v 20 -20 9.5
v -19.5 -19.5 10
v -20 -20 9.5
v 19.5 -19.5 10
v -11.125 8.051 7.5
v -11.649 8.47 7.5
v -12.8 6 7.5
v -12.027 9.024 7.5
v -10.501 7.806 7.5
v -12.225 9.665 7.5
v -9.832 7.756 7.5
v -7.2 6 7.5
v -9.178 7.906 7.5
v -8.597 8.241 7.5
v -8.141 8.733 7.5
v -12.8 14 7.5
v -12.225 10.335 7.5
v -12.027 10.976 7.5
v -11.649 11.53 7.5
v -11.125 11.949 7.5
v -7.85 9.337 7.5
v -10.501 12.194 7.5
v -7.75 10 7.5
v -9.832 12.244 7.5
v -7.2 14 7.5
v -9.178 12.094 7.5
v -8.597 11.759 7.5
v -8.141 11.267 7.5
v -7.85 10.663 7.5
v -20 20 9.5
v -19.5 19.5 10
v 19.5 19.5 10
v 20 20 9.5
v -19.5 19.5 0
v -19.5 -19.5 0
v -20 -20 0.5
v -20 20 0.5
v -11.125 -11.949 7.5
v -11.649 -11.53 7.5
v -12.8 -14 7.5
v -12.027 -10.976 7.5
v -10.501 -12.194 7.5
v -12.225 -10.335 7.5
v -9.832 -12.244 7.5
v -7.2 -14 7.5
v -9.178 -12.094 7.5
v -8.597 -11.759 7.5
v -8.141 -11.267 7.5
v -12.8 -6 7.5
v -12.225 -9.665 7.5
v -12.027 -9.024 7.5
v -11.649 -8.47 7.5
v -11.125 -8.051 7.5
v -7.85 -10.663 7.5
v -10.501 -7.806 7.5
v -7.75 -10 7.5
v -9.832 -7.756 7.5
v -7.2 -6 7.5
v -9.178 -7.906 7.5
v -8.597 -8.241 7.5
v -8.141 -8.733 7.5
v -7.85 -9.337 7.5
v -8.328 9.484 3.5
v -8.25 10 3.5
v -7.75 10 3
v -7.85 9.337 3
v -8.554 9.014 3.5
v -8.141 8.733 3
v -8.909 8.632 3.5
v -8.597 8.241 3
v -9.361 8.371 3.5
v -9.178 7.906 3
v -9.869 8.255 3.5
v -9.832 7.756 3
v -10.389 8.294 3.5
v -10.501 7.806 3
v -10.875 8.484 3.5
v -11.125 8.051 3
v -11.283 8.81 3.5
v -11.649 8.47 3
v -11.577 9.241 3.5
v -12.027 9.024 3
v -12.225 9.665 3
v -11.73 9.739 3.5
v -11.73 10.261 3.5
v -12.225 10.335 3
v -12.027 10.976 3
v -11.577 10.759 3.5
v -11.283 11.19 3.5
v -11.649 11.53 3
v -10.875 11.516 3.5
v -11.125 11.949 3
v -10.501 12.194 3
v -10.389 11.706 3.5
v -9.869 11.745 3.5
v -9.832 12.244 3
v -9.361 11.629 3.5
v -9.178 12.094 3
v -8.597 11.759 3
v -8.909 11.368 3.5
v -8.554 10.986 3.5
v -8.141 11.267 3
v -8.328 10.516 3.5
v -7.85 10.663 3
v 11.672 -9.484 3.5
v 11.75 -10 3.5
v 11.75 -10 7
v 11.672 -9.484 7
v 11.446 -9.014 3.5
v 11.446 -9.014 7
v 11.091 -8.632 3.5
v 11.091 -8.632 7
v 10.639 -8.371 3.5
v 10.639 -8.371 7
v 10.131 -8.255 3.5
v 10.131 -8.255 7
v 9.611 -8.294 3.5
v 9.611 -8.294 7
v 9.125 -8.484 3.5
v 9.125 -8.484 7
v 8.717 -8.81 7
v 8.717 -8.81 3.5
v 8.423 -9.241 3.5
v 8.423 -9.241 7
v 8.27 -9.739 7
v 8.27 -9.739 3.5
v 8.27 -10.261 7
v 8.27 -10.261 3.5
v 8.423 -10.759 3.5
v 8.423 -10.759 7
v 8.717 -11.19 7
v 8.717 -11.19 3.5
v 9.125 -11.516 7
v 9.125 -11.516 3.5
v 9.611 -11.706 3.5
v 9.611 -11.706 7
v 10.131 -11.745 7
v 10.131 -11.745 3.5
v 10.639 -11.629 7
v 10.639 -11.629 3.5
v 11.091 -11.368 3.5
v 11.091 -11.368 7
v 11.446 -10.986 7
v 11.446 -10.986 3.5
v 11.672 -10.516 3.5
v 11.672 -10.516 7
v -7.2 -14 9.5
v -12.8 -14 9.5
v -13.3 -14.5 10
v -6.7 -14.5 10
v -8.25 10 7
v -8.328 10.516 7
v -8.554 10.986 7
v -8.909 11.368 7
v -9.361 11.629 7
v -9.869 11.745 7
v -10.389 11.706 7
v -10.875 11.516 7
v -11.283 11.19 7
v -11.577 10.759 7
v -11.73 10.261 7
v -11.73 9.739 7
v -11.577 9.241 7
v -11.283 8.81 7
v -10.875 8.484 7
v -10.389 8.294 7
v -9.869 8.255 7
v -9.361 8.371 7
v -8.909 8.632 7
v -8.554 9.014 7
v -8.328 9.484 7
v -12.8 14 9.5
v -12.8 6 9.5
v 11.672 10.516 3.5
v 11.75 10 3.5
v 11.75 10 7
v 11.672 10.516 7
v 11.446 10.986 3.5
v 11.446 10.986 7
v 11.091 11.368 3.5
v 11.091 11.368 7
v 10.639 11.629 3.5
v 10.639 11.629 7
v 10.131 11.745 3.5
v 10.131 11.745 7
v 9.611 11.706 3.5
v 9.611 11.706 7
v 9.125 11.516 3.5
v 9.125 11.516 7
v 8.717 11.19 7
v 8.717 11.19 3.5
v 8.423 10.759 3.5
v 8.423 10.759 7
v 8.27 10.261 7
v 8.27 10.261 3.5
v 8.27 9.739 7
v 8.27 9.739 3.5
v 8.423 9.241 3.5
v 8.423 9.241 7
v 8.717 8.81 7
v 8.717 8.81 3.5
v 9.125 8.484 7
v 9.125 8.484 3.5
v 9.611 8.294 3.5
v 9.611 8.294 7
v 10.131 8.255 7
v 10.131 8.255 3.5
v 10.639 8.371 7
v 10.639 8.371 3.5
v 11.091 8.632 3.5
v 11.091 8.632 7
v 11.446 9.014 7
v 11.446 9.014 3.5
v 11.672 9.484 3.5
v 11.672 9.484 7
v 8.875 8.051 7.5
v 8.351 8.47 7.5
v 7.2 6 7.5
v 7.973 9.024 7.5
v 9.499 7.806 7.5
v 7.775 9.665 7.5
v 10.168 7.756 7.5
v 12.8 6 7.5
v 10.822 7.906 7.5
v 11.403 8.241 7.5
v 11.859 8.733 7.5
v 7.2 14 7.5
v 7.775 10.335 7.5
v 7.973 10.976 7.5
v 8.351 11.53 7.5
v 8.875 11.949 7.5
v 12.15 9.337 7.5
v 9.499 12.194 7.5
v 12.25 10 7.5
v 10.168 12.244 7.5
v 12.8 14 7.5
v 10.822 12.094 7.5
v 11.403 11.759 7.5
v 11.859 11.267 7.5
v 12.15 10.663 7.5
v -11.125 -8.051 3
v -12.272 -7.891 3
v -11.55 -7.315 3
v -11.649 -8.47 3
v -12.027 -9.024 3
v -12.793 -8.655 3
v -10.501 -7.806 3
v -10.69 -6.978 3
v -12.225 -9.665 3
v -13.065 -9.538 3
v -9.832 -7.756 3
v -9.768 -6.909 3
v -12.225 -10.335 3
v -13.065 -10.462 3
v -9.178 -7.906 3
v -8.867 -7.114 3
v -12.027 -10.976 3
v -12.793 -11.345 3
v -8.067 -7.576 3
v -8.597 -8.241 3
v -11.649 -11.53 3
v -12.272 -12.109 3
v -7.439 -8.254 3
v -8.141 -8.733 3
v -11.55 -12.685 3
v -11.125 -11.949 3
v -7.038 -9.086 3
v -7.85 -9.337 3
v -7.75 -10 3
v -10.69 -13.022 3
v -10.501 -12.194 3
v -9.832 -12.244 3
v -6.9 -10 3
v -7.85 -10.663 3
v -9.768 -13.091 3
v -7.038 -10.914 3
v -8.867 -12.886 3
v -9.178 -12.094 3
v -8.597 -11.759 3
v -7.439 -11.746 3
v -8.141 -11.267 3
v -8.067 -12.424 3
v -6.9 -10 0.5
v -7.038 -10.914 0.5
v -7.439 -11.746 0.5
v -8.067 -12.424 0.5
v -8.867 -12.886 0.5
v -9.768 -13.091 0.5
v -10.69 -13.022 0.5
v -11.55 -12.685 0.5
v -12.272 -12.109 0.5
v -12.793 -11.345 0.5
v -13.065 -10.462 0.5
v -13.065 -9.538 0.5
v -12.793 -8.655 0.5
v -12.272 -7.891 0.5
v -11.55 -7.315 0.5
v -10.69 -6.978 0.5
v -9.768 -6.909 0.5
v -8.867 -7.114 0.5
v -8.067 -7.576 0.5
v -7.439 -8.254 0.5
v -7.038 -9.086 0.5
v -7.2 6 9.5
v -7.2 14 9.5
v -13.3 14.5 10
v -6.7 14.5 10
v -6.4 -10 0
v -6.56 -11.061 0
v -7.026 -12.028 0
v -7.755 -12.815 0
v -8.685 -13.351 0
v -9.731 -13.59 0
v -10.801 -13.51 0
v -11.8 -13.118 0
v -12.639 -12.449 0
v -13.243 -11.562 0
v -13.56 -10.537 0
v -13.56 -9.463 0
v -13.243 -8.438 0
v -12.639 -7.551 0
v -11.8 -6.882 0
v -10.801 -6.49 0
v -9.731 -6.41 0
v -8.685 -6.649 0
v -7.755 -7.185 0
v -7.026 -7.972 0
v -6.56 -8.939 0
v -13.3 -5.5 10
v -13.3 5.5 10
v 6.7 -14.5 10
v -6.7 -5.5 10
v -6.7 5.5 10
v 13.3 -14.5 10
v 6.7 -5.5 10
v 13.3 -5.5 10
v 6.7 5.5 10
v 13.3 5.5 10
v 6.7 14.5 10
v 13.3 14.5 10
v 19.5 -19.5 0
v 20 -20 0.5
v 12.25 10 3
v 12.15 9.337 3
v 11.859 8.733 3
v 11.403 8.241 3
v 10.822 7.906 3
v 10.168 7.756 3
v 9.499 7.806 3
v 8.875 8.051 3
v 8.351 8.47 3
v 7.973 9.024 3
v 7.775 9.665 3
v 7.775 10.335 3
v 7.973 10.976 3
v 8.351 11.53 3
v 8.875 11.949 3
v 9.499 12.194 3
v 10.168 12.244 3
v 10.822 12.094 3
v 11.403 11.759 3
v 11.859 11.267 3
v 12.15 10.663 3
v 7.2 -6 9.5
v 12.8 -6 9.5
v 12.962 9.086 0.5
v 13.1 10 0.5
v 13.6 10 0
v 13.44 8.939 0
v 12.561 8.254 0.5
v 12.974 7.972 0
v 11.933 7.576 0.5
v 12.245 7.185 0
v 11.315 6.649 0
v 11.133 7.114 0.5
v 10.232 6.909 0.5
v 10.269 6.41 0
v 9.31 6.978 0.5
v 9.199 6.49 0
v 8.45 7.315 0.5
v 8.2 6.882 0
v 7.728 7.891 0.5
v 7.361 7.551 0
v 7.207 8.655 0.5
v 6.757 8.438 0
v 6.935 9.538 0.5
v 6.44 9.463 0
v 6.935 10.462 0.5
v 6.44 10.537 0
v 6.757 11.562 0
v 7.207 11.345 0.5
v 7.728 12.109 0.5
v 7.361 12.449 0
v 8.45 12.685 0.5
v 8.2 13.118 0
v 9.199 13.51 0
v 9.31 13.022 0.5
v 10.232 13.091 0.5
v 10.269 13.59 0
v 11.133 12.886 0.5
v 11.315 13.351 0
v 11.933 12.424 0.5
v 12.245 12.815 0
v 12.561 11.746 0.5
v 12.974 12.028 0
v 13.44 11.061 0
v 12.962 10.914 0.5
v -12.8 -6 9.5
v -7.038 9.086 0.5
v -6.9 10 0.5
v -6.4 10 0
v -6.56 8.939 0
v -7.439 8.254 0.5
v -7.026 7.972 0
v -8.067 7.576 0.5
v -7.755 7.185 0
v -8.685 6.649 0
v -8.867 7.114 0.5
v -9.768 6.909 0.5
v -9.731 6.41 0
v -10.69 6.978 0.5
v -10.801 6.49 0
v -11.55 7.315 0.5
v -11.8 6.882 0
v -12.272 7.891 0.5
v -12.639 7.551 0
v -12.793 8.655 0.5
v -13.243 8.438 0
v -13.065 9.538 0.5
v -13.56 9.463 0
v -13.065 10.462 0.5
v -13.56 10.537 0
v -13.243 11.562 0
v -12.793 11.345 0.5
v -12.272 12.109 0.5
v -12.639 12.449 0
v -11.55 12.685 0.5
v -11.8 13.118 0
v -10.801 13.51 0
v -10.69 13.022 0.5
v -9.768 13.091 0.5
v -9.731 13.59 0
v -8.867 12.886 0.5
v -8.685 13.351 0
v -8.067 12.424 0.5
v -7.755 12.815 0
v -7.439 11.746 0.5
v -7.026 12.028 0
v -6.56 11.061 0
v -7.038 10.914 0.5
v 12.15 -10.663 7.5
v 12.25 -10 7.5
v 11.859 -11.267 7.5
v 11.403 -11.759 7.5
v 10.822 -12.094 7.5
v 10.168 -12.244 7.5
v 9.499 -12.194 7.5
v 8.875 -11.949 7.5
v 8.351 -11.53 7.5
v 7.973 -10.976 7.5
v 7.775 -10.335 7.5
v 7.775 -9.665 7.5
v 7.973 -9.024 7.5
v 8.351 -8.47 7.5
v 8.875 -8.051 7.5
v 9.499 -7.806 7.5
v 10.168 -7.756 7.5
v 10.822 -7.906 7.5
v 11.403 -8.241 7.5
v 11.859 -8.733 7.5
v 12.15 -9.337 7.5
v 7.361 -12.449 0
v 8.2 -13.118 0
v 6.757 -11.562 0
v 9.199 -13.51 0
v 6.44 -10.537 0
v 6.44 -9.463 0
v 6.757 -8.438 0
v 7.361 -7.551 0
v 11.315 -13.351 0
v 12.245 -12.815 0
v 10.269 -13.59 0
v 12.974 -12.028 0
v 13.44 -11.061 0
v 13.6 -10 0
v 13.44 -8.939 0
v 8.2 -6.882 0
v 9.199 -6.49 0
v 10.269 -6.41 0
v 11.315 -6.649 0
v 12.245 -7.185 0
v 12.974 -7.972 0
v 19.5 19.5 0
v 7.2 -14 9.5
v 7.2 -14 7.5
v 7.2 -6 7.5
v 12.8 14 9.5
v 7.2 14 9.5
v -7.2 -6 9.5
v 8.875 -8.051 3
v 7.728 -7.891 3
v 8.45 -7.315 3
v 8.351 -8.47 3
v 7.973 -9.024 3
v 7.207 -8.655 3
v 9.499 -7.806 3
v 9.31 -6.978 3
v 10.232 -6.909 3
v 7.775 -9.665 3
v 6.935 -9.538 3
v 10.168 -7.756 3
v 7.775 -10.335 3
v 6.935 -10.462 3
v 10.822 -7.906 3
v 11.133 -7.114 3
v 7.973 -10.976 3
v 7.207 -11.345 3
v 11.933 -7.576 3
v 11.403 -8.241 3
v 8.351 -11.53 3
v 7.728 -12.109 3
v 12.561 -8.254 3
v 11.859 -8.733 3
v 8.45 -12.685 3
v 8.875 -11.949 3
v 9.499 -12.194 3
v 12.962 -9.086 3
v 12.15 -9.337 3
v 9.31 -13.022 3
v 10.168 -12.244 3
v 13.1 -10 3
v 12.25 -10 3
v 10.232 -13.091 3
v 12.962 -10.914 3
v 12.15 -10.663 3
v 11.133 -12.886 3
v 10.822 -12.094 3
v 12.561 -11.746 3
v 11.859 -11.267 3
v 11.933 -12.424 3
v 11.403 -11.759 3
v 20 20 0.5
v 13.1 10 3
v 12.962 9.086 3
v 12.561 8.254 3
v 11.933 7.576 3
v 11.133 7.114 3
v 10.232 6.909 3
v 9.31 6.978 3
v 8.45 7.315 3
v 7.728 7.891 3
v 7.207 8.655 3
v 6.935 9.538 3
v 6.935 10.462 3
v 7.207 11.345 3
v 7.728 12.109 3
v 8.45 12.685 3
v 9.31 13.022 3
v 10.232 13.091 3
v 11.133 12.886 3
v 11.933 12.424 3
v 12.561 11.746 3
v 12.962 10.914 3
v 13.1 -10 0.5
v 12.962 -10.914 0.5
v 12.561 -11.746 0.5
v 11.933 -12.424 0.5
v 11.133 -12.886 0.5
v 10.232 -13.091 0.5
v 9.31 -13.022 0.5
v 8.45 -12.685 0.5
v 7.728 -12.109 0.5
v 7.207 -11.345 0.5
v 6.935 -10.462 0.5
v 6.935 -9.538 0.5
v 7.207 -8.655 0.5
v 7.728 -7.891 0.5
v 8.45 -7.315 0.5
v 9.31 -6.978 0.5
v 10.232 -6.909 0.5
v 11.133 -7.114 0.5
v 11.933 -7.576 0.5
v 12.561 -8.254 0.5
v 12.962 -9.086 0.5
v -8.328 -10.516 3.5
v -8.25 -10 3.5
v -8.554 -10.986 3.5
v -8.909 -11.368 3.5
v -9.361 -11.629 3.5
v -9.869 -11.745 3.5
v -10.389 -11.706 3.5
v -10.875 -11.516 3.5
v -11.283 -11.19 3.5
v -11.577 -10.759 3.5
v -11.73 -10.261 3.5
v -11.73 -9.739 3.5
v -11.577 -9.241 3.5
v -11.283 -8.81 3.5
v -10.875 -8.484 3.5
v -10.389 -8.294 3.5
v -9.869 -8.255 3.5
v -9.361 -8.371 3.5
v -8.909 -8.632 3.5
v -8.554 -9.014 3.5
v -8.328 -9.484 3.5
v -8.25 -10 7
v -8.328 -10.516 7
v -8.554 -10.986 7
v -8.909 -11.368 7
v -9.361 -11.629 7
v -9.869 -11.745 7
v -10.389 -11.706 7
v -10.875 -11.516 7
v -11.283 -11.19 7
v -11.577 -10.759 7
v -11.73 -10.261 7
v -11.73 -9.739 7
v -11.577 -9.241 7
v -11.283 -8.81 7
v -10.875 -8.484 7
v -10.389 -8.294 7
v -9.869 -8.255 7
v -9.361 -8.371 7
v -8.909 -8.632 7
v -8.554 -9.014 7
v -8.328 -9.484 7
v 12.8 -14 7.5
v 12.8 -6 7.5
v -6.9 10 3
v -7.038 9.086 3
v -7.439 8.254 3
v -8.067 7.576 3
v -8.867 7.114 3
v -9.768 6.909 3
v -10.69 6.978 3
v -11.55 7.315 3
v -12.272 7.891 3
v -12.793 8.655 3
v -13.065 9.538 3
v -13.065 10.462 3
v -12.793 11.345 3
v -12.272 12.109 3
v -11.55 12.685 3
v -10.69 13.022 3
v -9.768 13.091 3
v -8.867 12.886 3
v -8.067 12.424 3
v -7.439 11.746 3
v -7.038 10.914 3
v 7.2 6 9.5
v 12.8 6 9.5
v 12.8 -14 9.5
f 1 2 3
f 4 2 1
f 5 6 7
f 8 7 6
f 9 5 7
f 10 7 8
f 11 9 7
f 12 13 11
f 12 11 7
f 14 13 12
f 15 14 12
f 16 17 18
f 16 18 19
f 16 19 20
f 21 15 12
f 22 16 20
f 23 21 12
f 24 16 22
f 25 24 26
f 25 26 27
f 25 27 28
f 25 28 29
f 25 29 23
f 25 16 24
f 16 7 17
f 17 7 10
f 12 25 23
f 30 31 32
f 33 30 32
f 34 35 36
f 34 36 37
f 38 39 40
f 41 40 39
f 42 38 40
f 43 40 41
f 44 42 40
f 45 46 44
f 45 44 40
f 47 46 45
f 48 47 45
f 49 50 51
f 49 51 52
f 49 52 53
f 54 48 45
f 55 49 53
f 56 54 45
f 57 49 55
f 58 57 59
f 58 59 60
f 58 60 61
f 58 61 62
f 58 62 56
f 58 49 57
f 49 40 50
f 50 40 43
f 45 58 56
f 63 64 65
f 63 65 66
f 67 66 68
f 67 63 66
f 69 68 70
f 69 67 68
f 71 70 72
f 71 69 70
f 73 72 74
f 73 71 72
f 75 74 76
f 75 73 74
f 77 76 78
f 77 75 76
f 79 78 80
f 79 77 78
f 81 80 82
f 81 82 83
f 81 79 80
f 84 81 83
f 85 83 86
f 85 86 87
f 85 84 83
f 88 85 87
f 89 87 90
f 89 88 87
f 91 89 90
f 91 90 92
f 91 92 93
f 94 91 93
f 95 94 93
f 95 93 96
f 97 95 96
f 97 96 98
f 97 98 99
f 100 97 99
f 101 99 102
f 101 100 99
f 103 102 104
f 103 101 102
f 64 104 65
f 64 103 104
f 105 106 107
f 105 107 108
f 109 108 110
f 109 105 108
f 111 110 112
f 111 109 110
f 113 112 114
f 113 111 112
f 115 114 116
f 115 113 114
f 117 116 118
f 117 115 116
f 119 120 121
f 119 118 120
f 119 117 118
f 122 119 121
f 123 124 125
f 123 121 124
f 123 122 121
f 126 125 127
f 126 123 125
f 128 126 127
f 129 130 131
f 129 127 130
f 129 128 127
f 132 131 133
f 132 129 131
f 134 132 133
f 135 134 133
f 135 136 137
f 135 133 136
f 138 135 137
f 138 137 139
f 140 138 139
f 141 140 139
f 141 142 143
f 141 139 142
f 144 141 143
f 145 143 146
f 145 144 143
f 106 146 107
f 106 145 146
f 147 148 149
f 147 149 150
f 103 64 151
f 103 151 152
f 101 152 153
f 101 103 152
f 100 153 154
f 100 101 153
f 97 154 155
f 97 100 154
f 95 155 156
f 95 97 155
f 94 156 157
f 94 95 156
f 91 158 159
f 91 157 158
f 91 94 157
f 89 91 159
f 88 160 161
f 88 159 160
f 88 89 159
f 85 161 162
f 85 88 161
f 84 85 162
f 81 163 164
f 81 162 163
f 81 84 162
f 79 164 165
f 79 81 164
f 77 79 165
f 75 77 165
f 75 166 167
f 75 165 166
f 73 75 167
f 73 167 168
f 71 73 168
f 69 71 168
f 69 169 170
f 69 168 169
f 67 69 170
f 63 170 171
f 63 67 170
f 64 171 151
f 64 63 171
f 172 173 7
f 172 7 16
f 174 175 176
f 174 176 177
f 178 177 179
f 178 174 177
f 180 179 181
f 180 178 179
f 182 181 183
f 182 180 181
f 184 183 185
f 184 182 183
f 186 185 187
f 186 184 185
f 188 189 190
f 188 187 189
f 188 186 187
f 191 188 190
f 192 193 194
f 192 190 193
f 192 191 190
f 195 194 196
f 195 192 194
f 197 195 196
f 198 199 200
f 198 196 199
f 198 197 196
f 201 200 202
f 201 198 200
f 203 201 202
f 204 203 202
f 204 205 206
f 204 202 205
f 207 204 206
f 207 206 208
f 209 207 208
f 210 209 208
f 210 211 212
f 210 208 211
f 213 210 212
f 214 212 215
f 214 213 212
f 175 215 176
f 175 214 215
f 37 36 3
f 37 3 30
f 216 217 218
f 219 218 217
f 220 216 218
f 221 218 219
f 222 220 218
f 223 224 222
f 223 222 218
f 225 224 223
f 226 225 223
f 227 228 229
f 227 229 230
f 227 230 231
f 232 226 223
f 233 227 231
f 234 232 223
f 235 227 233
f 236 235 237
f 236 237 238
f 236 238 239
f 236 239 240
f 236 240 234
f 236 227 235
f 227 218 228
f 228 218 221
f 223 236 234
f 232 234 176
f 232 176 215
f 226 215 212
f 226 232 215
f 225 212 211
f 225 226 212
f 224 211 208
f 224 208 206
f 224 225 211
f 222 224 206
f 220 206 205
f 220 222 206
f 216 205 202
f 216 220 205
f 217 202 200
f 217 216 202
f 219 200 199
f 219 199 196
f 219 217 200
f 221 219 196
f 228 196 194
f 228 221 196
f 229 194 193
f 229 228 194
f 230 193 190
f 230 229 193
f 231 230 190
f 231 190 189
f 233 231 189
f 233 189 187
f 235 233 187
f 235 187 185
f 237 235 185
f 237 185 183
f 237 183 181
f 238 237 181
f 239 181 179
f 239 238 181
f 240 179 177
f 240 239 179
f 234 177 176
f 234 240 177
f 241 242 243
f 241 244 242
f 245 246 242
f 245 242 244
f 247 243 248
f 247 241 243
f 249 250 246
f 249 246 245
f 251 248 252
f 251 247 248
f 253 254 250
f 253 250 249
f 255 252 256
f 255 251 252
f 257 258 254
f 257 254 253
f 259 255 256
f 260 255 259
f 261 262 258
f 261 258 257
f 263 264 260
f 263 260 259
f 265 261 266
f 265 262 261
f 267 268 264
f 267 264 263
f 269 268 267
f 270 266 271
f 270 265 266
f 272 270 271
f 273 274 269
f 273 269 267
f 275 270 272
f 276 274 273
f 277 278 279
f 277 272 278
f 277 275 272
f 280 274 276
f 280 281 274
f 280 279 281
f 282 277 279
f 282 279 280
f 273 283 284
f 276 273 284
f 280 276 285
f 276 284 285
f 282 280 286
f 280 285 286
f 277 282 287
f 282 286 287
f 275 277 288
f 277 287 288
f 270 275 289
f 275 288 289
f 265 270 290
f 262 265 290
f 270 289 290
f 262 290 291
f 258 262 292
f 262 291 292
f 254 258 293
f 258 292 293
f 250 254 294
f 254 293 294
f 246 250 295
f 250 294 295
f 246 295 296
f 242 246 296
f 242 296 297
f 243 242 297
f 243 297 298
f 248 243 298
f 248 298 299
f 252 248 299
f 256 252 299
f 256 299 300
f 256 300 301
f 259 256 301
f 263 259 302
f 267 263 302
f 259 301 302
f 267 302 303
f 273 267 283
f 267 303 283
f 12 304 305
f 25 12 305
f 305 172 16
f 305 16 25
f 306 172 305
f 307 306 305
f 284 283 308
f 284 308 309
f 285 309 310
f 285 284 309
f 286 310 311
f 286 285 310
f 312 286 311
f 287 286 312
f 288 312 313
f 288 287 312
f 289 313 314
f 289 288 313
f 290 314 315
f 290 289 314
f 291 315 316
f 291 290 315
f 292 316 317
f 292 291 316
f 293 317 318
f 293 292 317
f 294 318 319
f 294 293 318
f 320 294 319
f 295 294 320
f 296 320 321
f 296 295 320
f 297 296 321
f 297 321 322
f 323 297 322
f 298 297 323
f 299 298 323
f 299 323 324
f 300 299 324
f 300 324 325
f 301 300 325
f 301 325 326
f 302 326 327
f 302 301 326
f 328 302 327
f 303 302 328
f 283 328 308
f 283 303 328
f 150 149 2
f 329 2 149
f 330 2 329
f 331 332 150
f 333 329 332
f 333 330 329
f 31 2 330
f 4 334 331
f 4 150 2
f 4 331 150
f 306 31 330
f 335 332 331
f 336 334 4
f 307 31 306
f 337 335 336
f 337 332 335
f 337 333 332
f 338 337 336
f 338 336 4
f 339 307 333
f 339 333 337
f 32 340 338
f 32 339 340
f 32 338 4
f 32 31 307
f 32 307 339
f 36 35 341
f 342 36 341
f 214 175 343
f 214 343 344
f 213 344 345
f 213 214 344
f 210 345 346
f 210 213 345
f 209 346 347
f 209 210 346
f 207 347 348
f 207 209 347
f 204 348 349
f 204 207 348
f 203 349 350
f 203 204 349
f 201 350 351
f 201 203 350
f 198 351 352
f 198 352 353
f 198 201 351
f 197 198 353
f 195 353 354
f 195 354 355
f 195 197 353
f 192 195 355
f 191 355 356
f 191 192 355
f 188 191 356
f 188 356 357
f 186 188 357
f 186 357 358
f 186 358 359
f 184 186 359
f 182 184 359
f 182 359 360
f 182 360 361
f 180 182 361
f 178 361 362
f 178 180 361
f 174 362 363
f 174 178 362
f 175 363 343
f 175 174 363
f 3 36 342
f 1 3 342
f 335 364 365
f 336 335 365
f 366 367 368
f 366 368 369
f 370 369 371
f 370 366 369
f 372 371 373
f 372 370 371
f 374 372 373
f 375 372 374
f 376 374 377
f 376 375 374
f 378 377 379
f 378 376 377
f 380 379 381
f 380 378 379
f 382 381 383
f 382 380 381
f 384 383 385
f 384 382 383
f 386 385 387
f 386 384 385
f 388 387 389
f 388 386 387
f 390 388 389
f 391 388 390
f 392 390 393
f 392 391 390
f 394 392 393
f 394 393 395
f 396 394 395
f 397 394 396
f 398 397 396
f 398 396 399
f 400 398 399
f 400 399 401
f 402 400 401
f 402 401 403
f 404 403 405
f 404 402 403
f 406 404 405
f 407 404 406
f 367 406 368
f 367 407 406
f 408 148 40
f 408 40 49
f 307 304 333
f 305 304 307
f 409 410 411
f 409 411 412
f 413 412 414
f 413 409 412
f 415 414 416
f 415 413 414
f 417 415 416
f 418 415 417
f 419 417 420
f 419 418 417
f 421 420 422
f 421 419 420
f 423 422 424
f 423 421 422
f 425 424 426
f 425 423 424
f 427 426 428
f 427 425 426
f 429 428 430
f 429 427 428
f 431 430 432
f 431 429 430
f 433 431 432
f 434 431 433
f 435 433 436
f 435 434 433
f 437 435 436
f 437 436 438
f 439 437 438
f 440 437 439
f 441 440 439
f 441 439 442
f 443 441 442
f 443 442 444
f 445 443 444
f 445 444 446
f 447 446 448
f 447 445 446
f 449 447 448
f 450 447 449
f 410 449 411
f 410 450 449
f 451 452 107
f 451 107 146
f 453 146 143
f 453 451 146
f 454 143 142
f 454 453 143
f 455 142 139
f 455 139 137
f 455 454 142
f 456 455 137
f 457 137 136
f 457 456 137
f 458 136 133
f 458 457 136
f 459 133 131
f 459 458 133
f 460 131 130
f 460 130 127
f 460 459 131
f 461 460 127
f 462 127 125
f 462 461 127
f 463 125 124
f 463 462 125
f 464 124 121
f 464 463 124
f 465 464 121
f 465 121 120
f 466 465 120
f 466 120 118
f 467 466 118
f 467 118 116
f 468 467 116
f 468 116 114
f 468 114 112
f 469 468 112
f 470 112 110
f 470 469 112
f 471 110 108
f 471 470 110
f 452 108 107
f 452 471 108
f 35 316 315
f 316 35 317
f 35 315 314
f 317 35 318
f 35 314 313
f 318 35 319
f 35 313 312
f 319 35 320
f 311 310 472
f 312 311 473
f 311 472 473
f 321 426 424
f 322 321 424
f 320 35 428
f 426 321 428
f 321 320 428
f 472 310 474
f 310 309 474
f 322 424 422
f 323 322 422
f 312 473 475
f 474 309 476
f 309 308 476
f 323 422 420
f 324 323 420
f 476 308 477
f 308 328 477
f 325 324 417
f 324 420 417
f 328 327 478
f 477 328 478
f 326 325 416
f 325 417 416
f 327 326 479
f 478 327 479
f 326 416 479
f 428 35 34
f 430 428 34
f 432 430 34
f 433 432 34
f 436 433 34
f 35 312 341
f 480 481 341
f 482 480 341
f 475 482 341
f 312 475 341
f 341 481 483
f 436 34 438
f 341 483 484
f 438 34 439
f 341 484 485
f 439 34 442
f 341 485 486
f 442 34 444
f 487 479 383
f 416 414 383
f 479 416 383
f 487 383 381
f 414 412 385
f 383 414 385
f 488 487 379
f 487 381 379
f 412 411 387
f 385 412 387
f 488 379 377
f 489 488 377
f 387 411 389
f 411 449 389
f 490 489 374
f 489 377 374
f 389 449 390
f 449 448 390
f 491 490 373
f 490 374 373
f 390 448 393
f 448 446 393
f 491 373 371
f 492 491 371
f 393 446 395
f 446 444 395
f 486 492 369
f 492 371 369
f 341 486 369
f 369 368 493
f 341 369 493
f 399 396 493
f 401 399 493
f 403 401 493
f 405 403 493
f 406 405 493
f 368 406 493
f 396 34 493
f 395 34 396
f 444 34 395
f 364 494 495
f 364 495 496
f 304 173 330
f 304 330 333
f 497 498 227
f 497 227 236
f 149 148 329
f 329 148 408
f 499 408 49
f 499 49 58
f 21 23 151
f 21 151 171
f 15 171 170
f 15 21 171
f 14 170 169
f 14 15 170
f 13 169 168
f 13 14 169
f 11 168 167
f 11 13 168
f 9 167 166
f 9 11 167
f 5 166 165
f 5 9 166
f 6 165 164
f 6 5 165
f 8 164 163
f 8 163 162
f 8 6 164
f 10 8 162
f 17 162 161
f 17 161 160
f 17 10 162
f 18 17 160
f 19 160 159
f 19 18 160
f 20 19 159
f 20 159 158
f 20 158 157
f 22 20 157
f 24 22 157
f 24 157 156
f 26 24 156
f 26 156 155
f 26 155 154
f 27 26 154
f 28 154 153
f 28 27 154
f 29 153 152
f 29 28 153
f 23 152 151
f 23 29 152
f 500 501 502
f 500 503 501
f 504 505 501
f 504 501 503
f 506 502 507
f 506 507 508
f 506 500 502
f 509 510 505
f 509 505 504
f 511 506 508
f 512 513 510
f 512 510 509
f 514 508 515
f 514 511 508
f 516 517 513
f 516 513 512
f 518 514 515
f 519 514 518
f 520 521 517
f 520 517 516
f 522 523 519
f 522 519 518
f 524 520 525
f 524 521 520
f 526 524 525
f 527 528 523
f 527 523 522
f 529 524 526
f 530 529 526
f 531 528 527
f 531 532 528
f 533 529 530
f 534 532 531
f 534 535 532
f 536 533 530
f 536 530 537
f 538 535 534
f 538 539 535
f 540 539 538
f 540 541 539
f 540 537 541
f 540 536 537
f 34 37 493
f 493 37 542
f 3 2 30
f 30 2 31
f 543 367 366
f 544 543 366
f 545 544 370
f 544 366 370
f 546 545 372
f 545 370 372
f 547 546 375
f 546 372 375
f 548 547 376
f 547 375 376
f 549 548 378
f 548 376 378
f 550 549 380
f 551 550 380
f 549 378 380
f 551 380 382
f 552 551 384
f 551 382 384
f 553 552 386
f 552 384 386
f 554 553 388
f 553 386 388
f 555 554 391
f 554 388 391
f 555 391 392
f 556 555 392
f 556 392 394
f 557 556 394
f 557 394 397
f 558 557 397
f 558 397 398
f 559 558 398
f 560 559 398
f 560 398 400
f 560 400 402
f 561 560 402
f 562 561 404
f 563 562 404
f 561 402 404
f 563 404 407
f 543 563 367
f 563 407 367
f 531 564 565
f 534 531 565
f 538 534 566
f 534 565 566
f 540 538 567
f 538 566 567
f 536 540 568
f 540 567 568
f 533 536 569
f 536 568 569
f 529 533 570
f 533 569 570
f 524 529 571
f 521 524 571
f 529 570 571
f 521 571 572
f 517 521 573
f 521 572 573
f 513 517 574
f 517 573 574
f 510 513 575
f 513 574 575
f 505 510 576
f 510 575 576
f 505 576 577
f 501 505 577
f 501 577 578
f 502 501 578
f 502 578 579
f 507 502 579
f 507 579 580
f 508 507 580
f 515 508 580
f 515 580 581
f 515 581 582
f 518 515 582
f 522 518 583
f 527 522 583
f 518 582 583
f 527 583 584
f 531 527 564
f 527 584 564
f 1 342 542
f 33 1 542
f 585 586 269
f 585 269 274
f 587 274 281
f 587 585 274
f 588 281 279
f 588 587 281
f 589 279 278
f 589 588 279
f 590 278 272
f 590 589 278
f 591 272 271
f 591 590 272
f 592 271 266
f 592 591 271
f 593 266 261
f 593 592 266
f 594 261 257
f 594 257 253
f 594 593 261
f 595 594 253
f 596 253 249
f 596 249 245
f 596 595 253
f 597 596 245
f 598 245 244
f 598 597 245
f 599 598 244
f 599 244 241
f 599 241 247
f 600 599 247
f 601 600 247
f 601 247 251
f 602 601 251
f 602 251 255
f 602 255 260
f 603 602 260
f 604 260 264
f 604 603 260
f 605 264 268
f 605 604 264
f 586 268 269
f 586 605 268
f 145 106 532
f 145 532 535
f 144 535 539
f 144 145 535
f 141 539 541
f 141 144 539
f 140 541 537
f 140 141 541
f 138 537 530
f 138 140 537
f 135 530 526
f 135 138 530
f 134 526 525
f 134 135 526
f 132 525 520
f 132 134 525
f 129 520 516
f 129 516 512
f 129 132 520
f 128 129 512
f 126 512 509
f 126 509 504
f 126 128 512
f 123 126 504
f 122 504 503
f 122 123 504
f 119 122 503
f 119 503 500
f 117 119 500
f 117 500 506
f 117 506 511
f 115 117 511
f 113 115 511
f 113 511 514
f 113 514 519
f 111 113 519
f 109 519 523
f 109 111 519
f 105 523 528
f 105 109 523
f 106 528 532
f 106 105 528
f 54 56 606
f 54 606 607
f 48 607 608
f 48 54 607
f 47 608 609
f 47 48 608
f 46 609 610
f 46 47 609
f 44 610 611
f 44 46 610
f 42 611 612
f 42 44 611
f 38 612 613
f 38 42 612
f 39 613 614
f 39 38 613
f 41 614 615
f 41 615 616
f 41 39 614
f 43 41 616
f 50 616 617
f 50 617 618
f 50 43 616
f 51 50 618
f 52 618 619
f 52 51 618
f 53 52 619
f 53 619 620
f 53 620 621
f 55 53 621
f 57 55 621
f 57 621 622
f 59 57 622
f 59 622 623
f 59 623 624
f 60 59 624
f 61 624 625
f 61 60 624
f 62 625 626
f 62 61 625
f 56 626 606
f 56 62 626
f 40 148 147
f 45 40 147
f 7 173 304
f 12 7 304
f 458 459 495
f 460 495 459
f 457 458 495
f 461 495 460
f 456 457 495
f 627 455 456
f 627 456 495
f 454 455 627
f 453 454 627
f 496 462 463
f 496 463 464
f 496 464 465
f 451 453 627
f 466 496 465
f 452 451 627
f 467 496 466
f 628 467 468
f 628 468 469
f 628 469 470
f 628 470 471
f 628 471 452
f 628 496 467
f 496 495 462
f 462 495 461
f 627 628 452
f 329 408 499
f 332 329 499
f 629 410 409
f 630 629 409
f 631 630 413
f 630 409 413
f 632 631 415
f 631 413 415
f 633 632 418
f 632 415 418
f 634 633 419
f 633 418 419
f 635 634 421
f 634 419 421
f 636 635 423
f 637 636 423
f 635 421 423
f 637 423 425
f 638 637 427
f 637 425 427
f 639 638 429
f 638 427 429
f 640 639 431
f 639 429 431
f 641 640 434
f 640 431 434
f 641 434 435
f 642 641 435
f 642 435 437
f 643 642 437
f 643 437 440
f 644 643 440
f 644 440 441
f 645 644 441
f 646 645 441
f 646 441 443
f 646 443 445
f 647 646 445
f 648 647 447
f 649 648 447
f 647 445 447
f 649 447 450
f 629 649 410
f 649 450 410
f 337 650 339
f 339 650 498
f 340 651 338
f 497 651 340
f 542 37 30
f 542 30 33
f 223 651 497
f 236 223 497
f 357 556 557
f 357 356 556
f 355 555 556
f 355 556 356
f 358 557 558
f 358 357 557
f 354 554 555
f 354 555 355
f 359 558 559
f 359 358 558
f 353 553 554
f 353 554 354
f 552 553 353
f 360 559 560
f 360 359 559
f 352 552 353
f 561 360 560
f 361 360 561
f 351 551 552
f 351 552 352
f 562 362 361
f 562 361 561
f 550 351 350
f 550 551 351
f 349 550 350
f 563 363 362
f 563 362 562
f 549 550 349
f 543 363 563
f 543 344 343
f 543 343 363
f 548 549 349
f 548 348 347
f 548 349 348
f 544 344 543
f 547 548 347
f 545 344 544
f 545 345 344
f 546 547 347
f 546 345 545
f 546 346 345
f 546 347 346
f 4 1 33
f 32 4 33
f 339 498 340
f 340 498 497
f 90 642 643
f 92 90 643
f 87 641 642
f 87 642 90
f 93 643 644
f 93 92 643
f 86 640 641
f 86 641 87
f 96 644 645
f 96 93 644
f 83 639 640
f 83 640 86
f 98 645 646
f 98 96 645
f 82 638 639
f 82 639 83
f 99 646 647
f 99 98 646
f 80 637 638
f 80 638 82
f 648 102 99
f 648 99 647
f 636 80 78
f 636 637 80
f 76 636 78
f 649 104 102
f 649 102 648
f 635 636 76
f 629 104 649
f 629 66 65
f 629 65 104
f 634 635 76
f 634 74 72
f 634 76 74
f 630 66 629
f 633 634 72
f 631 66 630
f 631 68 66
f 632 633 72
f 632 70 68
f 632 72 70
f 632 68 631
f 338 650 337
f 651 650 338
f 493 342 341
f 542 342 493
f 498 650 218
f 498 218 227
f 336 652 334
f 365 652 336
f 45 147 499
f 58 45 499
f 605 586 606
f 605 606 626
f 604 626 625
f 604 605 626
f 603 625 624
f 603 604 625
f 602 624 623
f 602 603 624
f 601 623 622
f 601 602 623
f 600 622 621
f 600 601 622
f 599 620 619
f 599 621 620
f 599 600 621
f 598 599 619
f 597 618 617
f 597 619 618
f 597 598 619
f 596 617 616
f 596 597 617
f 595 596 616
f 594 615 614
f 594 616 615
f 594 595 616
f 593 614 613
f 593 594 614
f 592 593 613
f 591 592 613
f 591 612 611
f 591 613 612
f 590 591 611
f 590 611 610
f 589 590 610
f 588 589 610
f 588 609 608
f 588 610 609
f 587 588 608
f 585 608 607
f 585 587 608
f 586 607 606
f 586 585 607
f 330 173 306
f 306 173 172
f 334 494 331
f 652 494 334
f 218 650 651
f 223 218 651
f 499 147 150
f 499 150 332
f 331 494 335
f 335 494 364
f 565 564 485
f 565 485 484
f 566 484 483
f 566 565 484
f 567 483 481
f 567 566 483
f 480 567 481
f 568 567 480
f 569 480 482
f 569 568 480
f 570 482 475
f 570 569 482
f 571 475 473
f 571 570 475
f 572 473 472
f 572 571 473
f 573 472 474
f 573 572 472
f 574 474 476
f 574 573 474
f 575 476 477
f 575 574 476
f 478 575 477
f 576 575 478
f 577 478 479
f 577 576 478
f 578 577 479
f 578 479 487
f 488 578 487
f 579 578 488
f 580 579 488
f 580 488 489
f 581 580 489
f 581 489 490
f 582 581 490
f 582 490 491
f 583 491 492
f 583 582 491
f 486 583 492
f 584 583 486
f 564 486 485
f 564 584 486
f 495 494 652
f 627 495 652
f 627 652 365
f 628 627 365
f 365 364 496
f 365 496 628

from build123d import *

# Parameters (mm, degrees)
F0_W     = 40
F0_H     = 40
F0_R     = 1.75
F1_DEPTH = 10
F2_R     = 3.1
F3_DEPTH = 3
F4_W     = 5.6
F4_H     = 8
F5_DEPTH = 2.5
F6_SIZE  = 0.5
F7_SIZE  = 0.5


with BuildPart() as f1:
    # F0 (on Top) → F1 (new body)
    with BuildSketch(Plane.XY):
        Rectangle(F0_W, F0_H)
        with Locations((-10, -10)):
            Circle(F0_R, mode=Mode.SUBTRACT)
        with Locations((10, -10)):
            Circle(F0_R, mode=Mode.SUBTRACT)
        with Locations((-10, 10)):
            Circle(F0_R, mode=Mode.SUBTRACT)
        with Locations((10, 10)):
            Circle(F0_R, mode=Mode.SUBTRACT)
    extrude(amount=F1_DEPTH)

    # F2 (on face) → F3 (cut)
    with BuildSketch(Plane(origin=(0, 0, 0), x_dir=(1, 0, 0), z_dir=(0, 0, -1))):
        with Locations((10, 10)):
            Circle(F2_R)
        with Locations((10, -10)):
            Circle(F2_R)
        with Locations((-10, -10)):
            Circle(F2_R)
        with Locations((-10, 10)):
            Circle(F2_R)
    extrude(amount=-F3_DEPTH, mode=Mode.SUBTRACT)

    # F4 (on face) → F5 (cut)
    with BuildSketch(Plane.XY.offset(10)):
        with Locations((-10, 10)):
            Rectangle(F4_W, F4_H)
        with Locations((10, 10)):
            Rectangle(F4_W, F4_H)
        with Locations((10, -10)):
            Rectangle(F4_W, F4_H)
        with Locations((-10, -10)):
            Rectangle(F4_W, F4_H)
    extrude(amount=-F5_DEPTH, mode=Mode.SUBTRACT)

    # F6
    f6_edges = [f1.edges().sort_by_distance(p)[0] for p in [
        (-20, 0, 10),
        (0, 20, 10),
        (20, 0, 10),
        (0, -20, 10),
        (12.8, -10, 10),
        (10, -14, 10),
        (7.2, -10, 10),
        (10, -6, 10),
        (-7.2, -10, 10),
        (-12.8, -10, 10),
        (-10, -6, 10),
        (-10, -14, 10),
        (-10, 14, 10),
        (-12.8, 10, 10),
        (-10, 6, 10),
        (-7.2, 10, 10),
        (12.8, 10, 10),
        (10, 14, 10),
        (7.2, 10, 10),
        (10, 6, 10),
    ]]
    chamfer(f6_edges, length=F6_SIZE)

    # F7
    f7_edges = [f1.edges().sort_by_distance(p)[0] for p in [
        (6.9, -10, 0),
        (-13.1, -10, 0),
        (6.9, 10, 0),
        (-13.1, 10, 0),
        (8.25, -10, 3),
        (-11.75, -10, 3),
        (8.25, 10, 3),
        (-11.75, 10, 3),
        (-20, 0, 0),
        (0, 20, 0),
        (0, -20, 0),
        (20, 0, 0),
        (8.25, 10, 7.5),
        (8.25, -10, 7.5),
        (-11.75, 10, 7.5),
        (-11.75, -10, 7.5),
    ]]
    chamfer(f7_edges, length=F7_SIZE)


solid = f1.part
